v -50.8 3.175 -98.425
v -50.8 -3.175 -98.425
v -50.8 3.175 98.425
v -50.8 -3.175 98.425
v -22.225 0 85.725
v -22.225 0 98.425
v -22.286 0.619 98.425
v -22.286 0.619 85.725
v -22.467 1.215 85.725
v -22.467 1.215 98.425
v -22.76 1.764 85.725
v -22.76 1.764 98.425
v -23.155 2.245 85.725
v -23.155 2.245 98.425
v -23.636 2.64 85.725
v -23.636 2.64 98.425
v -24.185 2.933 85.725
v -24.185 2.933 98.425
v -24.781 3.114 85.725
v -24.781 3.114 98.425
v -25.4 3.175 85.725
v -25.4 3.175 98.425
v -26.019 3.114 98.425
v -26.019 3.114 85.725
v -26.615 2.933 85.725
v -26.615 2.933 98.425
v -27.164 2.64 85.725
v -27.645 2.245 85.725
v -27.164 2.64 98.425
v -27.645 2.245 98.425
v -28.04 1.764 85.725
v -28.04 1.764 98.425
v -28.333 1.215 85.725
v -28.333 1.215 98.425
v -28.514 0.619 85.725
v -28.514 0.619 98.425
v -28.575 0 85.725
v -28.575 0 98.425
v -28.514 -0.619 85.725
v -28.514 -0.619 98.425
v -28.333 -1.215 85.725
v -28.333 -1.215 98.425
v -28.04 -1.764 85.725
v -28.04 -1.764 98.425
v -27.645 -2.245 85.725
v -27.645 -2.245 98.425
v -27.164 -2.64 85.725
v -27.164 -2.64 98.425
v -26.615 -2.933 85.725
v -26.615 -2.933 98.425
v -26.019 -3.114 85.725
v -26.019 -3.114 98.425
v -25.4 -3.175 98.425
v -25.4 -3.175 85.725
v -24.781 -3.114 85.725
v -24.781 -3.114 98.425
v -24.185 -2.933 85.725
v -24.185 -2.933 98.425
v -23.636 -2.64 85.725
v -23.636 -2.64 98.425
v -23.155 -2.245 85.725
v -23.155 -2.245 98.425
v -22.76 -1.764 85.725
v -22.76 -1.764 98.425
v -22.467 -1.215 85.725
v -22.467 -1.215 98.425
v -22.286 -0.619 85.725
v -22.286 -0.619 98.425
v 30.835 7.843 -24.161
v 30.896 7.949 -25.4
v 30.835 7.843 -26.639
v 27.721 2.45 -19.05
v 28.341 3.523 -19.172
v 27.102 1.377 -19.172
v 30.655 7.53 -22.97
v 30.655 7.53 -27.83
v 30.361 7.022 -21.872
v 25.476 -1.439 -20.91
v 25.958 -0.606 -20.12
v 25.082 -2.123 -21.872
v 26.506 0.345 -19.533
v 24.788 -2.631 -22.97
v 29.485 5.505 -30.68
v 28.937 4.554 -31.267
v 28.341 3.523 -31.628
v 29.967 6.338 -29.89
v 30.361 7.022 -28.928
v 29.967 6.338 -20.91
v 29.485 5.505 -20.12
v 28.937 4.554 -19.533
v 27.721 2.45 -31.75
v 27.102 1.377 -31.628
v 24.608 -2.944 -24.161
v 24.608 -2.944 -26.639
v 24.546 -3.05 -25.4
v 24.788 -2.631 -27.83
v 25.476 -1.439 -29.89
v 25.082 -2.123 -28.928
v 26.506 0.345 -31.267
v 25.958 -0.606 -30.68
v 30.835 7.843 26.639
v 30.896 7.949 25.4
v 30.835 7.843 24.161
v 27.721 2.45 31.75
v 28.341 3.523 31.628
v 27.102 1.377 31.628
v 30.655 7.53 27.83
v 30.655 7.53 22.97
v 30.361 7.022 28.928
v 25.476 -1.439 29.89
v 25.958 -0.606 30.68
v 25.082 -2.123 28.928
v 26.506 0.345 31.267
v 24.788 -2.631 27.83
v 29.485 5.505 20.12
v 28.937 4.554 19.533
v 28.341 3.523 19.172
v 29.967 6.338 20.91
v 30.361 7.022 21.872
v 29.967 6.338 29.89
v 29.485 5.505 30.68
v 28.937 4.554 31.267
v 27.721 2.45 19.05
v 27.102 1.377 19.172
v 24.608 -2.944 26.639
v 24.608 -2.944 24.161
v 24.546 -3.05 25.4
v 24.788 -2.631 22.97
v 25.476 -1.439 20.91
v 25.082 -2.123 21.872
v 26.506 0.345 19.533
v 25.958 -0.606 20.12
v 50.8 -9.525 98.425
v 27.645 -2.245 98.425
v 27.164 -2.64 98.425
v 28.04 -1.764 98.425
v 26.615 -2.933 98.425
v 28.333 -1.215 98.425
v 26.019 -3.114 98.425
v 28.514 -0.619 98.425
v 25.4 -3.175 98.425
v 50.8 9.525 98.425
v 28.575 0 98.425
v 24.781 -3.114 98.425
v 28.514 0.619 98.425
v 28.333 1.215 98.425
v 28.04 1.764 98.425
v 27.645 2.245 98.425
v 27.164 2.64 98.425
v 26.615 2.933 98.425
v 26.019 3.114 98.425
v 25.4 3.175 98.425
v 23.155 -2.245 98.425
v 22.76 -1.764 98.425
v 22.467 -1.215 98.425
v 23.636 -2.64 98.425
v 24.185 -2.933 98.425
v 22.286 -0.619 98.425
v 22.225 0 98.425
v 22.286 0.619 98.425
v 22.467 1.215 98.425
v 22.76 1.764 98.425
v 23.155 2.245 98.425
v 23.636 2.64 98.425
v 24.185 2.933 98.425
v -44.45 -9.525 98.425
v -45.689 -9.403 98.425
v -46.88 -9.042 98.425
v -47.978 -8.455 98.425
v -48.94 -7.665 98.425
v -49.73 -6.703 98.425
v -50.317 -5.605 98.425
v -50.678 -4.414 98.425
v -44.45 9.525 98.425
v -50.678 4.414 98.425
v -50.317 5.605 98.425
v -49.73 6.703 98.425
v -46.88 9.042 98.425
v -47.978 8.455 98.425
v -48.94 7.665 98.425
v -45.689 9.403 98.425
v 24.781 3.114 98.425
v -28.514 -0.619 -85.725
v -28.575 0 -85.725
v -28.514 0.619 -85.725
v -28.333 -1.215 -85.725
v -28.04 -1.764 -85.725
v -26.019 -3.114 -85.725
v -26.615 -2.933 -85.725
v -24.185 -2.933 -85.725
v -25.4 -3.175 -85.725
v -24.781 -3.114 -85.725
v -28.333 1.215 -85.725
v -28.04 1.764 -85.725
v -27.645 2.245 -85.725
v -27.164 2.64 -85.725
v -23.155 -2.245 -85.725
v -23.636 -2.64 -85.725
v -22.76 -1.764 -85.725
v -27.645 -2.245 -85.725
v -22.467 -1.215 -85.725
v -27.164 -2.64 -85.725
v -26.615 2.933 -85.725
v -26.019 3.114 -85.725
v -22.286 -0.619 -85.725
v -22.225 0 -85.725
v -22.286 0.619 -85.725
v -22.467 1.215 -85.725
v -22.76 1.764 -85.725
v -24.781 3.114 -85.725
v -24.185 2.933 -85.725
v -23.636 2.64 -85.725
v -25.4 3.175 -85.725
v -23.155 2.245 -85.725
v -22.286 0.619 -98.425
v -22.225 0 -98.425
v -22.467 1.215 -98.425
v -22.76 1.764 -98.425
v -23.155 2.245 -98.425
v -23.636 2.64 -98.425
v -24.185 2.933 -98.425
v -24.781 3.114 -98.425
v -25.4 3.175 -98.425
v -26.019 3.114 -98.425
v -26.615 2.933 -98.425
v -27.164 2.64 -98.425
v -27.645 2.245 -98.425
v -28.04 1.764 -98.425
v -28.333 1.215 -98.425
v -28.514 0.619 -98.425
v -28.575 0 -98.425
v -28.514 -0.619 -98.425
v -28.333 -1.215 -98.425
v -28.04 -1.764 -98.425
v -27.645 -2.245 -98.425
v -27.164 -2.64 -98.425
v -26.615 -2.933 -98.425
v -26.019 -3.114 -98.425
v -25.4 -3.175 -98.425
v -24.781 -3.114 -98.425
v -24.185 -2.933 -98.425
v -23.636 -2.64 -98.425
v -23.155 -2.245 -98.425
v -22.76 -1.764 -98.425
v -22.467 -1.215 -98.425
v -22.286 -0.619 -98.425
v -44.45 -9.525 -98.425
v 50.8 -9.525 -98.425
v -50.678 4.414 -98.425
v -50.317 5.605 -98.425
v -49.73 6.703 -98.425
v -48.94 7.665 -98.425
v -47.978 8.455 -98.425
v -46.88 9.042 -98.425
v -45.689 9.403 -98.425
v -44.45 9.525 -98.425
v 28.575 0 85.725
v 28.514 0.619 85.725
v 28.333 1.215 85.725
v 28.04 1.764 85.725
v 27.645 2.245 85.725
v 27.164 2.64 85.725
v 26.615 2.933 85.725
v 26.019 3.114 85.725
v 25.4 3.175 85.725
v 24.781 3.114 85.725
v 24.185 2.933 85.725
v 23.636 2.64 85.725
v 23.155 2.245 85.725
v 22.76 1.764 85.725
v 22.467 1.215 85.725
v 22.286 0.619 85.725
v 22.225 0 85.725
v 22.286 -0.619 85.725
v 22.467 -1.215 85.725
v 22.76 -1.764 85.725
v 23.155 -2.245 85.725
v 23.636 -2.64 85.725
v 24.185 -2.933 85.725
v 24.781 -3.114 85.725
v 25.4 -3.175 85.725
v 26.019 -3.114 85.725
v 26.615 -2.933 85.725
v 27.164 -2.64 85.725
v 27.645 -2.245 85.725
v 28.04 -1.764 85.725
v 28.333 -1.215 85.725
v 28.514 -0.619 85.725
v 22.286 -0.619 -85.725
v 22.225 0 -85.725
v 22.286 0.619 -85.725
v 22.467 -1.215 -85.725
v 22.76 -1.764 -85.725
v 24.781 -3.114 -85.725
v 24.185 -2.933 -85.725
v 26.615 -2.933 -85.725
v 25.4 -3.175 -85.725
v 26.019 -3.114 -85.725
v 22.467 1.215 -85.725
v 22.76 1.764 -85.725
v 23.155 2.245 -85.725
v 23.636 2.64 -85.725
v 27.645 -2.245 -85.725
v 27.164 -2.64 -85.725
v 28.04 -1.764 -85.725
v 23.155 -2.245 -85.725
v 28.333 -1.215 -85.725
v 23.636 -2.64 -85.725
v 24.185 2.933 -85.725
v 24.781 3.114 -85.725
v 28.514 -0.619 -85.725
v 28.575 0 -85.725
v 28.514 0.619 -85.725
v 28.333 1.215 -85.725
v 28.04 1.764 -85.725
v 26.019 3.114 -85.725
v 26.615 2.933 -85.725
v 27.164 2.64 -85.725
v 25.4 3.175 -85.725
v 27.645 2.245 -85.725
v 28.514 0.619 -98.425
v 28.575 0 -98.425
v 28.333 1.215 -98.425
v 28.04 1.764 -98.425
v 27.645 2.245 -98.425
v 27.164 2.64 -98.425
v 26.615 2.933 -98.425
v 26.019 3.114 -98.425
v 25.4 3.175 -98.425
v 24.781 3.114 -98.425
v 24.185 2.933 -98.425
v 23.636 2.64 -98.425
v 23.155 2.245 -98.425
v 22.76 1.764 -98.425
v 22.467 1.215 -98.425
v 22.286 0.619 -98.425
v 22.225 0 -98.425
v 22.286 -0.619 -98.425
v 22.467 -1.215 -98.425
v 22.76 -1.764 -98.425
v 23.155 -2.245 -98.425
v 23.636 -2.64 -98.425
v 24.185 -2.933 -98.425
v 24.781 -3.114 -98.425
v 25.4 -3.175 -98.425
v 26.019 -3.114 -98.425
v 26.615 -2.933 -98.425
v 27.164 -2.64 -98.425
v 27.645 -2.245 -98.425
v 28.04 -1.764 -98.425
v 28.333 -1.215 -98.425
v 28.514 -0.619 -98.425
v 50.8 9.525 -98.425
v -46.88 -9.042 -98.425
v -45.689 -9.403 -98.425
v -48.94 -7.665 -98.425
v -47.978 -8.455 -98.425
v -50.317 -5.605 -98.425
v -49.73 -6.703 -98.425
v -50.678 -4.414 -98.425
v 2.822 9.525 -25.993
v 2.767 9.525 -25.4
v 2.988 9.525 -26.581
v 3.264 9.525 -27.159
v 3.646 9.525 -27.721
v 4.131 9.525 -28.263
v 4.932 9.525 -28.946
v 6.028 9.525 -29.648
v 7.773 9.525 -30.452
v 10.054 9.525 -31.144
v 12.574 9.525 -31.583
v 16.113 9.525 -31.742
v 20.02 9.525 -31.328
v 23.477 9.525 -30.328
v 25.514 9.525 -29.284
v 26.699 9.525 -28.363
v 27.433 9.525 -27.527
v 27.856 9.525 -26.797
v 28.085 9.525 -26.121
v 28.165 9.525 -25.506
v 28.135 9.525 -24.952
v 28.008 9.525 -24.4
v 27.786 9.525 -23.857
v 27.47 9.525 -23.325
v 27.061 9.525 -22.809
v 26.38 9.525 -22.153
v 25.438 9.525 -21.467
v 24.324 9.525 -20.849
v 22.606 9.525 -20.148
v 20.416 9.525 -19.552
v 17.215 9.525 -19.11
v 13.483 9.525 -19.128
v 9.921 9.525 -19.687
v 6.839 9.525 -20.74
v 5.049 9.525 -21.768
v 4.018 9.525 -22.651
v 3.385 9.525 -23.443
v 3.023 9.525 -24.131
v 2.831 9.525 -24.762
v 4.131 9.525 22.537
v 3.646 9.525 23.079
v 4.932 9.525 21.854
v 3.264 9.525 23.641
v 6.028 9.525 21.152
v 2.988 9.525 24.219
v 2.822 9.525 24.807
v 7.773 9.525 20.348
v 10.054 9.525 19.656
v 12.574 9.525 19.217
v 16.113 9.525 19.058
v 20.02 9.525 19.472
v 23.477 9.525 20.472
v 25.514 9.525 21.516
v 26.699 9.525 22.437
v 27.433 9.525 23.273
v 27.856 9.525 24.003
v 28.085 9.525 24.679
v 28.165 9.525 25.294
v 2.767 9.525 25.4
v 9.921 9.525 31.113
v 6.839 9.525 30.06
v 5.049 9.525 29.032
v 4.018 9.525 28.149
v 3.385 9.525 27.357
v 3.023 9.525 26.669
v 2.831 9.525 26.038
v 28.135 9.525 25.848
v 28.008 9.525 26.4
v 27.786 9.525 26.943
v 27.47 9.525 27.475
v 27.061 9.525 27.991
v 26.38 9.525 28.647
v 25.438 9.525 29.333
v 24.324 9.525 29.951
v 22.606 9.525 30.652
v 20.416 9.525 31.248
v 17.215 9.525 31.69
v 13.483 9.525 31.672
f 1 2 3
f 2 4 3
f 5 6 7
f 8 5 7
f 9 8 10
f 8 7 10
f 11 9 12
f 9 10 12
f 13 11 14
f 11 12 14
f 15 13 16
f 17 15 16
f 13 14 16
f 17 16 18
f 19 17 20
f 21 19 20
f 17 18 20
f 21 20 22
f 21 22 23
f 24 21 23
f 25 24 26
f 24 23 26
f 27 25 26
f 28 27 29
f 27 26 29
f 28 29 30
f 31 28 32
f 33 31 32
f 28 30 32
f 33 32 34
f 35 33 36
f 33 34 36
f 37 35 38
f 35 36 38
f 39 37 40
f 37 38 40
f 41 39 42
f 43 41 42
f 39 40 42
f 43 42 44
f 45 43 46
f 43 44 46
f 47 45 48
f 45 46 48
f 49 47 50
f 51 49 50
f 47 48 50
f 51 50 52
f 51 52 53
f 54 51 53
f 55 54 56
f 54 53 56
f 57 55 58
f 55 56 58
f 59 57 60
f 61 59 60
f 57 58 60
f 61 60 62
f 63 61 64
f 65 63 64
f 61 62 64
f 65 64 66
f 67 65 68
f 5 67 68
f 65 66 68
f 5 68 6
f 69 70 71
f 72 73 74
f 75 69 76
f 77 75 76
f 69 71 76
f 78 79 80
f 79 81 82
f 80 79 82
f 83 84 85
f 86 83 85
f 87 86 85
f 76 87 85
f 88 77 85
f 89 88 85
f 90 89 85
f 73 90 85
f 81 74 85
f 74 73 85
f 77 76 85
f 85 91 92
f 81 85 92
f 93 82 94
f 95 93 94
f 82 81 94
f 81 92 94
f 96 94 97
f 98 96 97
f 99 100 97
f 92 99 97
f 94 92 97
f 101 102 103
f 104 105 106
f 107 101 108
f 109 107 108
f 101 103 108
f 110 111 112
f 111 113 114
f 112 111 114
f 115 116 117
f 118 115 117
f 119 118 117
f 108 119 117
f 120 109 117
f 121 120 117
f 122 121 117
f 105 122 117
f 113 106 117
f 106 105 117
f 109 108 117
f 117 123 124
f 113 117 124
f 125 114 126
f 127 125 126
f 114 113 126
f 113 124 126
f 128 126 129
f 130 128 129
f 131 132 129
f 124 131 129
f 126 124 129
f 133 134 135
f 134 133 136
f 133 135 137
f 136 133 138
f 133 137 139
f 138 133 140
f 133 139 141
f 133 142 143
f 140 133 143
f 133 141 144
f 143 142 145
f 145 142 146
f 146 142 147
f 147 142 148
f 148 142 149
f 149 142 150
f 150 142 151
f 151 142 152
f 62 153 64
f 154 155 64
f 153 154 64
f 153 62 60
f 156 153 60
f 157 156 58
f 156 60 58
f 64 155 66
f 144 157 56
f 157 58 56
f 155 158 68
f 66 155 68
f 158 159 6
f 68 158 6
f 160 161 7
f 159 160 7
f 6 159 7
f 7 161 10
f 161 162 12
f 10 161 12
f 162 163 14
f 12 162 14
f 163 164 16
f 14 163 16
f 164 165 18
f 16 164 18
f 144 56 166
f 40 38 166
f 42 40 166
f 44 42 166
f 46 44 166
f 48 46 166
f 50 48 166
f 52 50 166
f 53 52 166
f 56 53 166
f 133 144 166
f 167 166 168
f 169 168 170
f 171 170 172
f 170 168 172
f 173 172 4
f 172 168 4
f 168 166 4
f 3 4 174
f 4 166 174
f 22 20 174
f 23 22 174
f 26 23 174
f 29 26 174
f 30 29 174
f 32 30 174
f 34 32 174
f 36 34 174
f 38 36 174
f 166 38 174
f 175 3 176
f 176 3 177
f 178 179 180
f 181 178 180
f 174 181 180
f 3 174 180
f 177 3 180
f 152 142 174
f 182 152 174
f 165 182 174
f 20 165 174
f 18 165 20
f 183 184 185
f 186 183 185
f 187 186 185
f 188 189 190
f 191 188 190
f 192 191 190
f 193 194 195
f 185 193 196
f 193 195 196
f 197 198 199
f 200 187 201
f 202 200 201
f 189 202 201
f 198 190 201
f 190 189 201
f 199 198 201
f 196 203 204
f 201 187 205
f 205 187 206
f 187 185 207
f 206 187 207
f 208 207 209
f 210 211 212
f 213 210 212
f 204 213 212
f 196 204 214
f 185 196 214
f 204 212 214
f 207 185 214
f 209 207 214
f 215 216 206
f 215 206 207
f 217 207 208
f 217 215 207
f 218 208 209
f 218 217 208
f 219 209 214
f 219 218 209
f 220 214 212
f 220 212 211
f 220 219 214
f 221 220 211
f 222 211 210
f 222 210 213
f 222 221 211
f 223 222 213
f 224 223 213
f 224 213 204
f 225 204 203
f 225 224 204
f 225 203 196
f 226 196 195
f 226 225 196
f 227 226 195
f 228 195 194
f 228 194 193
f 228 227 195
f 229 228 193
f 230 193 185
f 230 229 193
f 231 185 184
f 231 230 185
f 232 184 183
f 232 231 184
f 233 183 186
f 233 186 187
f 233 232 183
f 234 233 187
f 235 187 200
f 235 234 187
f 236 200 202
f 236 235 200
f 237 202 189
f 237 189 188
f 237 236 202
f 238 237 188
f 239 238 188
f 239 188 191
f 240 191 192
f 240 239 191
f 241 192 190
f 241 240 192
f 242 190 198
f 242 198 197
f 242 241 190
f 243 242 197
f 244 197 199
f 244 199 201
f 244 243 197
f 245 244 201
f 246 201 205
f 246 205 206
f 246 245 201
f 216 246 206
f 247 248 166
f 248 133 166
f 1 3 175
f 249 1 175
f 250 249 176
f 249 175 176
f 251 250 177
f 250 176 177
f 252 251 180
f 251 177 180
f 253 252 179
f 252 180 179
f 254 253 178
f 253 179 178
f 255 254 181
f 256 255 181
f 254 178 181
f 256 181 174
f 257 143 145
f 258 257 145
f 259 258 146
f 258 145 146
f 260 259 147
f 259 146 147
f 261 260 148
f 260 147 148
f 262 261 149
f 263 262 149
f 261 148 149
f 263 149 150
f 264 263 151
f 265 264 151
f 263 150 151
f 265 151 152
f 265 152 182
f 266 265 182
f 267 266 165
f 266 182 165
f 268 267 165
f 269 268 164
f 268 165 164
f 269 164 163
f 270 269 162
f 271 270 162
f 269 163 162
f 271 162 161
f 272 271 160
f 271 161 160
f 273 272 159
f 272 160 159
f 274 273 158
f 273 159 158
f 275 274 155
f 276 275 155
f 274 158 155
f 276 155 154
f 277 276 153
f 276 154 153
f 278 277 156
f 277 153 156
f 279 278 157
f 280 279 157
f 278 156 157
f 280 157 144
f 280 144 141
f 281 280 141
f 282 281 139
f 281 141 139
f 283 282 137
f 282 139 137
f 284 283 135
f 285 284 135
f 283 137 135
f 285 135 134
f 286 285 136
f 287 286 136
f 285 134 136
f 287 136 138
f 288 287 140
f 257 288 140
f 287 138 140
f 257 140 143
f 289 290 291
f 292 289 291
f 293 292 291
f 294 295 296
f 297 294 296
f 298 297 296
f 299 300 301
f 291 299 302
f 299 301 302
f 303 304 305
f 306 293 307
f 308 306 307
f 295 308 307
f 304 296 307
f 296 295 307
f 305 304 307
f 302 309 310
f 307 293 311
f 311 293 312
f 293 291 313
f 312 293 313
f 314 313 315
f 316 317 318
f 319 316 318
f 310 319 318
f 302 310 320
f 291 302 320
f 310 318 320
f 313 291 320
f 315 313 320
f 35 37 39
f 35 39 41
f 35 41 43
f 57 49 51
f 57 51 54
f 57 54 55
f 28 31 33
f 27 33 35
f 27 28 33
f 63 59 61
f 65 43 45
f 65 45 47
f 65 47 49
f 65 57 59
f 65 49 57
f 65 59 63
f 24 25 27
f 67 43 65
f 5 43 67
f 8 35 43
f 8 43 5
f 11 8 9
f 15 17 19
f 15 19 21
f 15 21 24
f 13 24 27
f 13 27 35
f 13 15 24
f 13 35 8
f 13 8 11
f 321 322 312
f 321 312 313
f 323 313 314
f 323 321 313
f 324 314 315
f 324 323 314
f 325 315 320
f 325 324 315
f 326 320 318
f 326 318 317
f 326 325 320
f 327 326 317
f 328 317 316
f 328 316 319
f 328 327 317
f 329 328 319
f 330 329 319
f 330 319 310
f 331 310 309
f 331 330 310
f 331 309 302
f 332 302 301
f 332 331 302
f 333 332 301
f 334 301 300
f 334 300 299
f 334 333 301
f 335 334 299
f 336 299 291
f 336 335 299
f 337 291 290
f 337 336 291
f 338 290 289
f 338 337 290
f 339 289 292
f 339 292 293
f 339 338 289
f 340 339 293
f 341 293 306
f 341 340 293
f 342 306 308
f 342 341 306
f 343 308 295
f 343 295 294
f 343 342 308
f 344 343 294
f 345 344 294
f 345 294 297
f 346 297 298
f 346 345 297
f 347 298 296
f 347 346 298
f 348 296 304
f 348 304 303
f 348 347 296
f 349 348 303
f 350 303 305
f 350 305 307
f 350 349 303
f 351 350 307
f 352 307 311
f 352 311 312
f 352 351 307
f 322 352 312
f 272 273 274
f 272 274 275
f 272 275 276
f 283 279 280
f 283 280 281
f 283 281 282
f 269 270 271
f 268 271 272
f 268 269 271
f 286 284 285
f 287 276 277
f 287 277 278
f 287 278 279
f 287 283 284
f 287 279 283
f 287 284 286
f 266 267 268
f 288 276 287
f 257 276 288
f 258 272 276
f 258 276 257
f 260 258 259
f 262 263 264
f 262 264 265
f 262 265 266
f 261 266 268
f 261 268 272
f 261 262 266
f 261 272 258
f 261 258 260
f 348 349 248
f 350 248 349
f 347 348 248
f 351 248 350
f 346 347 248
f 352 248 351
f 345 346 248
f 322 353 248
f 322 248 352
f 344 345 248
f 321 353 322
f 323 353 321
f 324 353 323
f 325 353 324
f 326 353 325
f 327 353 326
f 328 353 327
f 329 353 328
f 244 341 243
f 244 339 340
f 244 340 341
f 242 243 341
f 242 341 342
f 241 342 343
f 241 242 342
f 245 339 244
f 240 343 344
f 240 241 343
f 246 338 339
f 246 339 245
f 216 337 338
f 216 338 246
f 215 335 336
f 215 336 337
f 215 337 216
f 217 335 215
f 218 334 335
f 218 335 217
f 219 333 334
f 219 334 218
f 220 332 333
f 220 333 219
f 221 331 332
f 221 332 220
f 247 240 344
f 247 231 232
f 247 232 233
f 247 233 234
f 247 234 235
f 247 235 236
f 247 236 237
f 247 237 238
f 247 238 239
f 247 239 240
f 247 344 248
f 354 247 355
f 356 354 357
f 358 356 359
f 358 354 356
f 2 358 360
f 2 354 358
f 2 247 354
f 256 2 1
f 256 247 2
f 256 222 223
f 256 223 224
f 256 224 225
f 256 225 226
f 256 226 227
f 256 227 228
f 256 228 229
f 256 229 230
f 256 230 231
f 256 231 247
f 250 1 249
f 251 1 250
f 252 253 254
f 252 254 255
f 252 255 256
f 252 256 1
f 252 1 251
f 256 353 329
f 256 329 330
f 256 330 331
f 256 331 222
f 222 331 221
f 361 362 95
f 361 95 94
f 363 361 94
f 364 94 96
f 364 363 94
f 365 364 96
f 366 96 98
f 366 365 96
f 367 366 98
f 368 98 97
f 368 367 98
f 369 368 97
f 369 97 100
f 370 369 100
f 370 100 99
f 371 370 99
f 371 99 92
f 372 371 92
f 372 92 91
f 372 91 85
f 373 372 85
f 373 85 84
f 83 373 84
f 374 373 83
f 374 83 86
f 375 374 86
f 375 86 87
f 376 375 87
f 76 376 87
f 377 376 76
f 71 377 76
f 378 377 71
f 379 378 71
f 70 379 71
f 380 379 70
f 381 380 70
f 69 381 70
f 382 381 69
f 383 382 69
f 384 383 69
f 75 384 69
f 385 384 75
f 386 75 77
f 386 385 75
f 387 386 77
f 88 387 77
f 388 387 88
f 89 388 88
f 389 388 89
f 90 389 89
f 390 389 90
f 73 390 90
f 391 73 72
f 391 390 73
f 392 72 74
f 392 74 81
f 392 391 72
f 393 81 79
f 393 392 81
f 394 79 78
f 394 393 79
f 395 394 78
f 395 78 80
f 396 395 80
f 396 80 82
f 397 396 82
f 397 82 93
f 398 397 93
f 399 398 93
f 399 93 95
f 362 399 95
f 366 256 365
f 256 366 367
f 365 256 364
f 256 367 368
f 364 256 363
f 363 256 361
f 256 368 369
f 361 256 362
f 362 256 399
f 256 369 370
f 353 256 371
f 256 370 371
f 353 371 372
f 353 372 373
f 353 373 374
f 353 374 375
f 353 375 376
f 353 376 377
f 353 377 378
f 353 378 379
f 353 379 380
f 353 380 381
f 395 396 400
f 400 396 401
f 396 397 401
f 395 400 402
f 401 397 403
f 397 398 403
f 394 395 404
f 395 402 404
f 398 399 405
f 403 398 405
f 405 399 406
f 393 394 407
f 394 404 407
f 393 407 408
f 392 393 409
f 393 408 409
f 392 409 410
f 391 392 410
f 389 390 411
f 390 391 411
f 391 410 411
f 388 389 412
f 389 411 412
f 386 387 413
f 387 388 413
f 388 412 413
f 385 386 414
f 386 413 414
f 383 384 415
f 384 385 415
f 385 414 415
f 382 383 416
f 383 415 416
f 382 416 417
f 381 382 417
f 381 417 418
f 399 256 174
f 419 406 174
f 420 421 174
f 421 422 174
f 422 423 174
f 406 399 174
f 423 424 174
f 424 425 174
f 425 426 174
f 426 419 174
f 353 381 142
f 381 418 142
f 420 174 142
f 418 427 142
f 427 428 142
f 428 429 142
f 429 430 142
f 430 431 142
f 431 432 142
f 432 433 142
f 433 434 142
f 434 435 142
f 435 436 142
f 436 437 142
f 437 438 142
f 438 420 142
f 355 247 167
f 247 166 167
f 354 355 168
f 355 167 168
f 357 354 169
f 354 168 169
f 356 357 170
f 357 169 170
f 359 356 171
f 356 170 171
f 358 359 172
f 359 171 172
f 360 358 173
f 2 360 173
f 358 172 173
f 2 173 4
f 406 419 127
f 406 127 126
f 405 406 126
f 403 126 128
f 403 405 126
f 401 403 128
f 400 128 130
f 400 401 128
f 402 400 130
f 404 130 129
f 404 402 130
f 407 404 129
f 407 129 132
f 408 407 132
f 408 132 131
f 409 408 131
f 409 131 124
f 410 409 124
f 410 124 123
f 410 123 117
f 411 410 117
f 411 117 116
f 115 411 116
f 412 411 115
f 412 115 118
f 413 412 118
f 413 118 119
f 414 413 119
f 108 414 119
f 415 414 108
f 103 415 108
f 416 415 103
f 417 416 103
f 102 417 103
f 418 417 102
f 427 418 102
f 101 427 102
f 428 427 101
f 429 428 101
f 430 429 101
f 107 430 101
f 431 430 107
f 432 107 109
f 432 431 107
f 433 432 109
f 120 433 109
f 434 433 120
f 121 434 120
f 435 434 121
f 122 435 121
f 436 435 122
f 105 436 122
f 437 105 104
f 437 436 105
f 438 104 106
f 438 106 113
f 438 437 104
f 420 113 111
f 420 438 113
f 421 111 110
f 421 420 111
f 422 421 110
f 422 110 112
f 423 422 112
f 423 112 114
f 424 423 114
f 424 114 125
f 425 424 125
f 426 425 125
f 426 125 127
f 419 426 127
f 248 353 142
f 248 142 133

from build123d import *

# Parameters (mm, degrees)
BOSS_EXTRUDE1_DEPTH = 98.425
SKETCH2_R           = 3.175
CUT_EXTRUDE1_DEPTH  = 12.7
SKETCH3_R           = 6.35
CUT_EXTRUDE2_DEPTH  = 66.04


with BuildPart() as part:
    # Sketch1 → Boss-Extrude1 (new body, symmetric)
    with BuildSketch(Plane.XY):
        with BuildLine():
            Line((44.45, 9.525), (50.8, 9.525))
            Line((50.8, 9.525), (50.8, 3.175))
            Line((50.8, 3.175), (50.8, -3.175))
            Line((50.8, -3.175), (50.8, -9.525))
            Line((50.8, -9.525), (44.45, -9.525))
            Line((44.45, -9.525), (-44.45, -9.525))
            ThreePointArc((-44.45, -9.525), (-48.940128061, -7.665128061), (-50.8, -3.175))
            Line((-50.8, -3.175), (-50.8, 3.175))
            ThreePointArc((-50.8, 3.175), (-48.940128061, 7.665128061), (-44.45, 9.525))
            Line((-44.45, 9.525), (44.45, 9.525))
        make_face()
    extrude(amount=BOSS_EXTRUDE1_DEPTH, both=True)

    # Sketch2 → Cut-Extrude1 (cut)
    with BuildSketch(Plane.XY.offset(98.425)):
        with Locations((-25.4, 0)):
            Circle(SKETCH2_R)
        with Locations((25.4, 0)):
            Circle(SKETCH2_R)
    cut_extrude1 = extrude(amount=-CUT_EXTRUDE1_DEPTH, mode=Mode.SUBTRACT)

    # Sketch3 → Cut-Extrude2 (cut)
    with BuildSketch(Plane(origin=(-37.461945986, 21.628664599, 0), x_dir=(0, 0, -1), z_dir=(0.866025404, -0.5, 0))):
        with Locations(Location((-25.4, 15.982254693, 0), (0, 0, 270))):  # turned: the seam where the file's is
            Circle(SKETCH3_R)
        with Locations(Location((25.4, 15.982254693, 0), (0, 0, 270))):  # turned: the seam where the file's is
            Circle(SKETCH3_R)
    extrude(amount=CUT_EXTRUDE2_DEPTH, mode=Mode.SUBTRACT)

    # Mirror1: Cut-Extrude1 across plane
    add(cut_extrude1.mirror(Plane.XY), mode=Mode.SUBTRACT)


solid = part.part
